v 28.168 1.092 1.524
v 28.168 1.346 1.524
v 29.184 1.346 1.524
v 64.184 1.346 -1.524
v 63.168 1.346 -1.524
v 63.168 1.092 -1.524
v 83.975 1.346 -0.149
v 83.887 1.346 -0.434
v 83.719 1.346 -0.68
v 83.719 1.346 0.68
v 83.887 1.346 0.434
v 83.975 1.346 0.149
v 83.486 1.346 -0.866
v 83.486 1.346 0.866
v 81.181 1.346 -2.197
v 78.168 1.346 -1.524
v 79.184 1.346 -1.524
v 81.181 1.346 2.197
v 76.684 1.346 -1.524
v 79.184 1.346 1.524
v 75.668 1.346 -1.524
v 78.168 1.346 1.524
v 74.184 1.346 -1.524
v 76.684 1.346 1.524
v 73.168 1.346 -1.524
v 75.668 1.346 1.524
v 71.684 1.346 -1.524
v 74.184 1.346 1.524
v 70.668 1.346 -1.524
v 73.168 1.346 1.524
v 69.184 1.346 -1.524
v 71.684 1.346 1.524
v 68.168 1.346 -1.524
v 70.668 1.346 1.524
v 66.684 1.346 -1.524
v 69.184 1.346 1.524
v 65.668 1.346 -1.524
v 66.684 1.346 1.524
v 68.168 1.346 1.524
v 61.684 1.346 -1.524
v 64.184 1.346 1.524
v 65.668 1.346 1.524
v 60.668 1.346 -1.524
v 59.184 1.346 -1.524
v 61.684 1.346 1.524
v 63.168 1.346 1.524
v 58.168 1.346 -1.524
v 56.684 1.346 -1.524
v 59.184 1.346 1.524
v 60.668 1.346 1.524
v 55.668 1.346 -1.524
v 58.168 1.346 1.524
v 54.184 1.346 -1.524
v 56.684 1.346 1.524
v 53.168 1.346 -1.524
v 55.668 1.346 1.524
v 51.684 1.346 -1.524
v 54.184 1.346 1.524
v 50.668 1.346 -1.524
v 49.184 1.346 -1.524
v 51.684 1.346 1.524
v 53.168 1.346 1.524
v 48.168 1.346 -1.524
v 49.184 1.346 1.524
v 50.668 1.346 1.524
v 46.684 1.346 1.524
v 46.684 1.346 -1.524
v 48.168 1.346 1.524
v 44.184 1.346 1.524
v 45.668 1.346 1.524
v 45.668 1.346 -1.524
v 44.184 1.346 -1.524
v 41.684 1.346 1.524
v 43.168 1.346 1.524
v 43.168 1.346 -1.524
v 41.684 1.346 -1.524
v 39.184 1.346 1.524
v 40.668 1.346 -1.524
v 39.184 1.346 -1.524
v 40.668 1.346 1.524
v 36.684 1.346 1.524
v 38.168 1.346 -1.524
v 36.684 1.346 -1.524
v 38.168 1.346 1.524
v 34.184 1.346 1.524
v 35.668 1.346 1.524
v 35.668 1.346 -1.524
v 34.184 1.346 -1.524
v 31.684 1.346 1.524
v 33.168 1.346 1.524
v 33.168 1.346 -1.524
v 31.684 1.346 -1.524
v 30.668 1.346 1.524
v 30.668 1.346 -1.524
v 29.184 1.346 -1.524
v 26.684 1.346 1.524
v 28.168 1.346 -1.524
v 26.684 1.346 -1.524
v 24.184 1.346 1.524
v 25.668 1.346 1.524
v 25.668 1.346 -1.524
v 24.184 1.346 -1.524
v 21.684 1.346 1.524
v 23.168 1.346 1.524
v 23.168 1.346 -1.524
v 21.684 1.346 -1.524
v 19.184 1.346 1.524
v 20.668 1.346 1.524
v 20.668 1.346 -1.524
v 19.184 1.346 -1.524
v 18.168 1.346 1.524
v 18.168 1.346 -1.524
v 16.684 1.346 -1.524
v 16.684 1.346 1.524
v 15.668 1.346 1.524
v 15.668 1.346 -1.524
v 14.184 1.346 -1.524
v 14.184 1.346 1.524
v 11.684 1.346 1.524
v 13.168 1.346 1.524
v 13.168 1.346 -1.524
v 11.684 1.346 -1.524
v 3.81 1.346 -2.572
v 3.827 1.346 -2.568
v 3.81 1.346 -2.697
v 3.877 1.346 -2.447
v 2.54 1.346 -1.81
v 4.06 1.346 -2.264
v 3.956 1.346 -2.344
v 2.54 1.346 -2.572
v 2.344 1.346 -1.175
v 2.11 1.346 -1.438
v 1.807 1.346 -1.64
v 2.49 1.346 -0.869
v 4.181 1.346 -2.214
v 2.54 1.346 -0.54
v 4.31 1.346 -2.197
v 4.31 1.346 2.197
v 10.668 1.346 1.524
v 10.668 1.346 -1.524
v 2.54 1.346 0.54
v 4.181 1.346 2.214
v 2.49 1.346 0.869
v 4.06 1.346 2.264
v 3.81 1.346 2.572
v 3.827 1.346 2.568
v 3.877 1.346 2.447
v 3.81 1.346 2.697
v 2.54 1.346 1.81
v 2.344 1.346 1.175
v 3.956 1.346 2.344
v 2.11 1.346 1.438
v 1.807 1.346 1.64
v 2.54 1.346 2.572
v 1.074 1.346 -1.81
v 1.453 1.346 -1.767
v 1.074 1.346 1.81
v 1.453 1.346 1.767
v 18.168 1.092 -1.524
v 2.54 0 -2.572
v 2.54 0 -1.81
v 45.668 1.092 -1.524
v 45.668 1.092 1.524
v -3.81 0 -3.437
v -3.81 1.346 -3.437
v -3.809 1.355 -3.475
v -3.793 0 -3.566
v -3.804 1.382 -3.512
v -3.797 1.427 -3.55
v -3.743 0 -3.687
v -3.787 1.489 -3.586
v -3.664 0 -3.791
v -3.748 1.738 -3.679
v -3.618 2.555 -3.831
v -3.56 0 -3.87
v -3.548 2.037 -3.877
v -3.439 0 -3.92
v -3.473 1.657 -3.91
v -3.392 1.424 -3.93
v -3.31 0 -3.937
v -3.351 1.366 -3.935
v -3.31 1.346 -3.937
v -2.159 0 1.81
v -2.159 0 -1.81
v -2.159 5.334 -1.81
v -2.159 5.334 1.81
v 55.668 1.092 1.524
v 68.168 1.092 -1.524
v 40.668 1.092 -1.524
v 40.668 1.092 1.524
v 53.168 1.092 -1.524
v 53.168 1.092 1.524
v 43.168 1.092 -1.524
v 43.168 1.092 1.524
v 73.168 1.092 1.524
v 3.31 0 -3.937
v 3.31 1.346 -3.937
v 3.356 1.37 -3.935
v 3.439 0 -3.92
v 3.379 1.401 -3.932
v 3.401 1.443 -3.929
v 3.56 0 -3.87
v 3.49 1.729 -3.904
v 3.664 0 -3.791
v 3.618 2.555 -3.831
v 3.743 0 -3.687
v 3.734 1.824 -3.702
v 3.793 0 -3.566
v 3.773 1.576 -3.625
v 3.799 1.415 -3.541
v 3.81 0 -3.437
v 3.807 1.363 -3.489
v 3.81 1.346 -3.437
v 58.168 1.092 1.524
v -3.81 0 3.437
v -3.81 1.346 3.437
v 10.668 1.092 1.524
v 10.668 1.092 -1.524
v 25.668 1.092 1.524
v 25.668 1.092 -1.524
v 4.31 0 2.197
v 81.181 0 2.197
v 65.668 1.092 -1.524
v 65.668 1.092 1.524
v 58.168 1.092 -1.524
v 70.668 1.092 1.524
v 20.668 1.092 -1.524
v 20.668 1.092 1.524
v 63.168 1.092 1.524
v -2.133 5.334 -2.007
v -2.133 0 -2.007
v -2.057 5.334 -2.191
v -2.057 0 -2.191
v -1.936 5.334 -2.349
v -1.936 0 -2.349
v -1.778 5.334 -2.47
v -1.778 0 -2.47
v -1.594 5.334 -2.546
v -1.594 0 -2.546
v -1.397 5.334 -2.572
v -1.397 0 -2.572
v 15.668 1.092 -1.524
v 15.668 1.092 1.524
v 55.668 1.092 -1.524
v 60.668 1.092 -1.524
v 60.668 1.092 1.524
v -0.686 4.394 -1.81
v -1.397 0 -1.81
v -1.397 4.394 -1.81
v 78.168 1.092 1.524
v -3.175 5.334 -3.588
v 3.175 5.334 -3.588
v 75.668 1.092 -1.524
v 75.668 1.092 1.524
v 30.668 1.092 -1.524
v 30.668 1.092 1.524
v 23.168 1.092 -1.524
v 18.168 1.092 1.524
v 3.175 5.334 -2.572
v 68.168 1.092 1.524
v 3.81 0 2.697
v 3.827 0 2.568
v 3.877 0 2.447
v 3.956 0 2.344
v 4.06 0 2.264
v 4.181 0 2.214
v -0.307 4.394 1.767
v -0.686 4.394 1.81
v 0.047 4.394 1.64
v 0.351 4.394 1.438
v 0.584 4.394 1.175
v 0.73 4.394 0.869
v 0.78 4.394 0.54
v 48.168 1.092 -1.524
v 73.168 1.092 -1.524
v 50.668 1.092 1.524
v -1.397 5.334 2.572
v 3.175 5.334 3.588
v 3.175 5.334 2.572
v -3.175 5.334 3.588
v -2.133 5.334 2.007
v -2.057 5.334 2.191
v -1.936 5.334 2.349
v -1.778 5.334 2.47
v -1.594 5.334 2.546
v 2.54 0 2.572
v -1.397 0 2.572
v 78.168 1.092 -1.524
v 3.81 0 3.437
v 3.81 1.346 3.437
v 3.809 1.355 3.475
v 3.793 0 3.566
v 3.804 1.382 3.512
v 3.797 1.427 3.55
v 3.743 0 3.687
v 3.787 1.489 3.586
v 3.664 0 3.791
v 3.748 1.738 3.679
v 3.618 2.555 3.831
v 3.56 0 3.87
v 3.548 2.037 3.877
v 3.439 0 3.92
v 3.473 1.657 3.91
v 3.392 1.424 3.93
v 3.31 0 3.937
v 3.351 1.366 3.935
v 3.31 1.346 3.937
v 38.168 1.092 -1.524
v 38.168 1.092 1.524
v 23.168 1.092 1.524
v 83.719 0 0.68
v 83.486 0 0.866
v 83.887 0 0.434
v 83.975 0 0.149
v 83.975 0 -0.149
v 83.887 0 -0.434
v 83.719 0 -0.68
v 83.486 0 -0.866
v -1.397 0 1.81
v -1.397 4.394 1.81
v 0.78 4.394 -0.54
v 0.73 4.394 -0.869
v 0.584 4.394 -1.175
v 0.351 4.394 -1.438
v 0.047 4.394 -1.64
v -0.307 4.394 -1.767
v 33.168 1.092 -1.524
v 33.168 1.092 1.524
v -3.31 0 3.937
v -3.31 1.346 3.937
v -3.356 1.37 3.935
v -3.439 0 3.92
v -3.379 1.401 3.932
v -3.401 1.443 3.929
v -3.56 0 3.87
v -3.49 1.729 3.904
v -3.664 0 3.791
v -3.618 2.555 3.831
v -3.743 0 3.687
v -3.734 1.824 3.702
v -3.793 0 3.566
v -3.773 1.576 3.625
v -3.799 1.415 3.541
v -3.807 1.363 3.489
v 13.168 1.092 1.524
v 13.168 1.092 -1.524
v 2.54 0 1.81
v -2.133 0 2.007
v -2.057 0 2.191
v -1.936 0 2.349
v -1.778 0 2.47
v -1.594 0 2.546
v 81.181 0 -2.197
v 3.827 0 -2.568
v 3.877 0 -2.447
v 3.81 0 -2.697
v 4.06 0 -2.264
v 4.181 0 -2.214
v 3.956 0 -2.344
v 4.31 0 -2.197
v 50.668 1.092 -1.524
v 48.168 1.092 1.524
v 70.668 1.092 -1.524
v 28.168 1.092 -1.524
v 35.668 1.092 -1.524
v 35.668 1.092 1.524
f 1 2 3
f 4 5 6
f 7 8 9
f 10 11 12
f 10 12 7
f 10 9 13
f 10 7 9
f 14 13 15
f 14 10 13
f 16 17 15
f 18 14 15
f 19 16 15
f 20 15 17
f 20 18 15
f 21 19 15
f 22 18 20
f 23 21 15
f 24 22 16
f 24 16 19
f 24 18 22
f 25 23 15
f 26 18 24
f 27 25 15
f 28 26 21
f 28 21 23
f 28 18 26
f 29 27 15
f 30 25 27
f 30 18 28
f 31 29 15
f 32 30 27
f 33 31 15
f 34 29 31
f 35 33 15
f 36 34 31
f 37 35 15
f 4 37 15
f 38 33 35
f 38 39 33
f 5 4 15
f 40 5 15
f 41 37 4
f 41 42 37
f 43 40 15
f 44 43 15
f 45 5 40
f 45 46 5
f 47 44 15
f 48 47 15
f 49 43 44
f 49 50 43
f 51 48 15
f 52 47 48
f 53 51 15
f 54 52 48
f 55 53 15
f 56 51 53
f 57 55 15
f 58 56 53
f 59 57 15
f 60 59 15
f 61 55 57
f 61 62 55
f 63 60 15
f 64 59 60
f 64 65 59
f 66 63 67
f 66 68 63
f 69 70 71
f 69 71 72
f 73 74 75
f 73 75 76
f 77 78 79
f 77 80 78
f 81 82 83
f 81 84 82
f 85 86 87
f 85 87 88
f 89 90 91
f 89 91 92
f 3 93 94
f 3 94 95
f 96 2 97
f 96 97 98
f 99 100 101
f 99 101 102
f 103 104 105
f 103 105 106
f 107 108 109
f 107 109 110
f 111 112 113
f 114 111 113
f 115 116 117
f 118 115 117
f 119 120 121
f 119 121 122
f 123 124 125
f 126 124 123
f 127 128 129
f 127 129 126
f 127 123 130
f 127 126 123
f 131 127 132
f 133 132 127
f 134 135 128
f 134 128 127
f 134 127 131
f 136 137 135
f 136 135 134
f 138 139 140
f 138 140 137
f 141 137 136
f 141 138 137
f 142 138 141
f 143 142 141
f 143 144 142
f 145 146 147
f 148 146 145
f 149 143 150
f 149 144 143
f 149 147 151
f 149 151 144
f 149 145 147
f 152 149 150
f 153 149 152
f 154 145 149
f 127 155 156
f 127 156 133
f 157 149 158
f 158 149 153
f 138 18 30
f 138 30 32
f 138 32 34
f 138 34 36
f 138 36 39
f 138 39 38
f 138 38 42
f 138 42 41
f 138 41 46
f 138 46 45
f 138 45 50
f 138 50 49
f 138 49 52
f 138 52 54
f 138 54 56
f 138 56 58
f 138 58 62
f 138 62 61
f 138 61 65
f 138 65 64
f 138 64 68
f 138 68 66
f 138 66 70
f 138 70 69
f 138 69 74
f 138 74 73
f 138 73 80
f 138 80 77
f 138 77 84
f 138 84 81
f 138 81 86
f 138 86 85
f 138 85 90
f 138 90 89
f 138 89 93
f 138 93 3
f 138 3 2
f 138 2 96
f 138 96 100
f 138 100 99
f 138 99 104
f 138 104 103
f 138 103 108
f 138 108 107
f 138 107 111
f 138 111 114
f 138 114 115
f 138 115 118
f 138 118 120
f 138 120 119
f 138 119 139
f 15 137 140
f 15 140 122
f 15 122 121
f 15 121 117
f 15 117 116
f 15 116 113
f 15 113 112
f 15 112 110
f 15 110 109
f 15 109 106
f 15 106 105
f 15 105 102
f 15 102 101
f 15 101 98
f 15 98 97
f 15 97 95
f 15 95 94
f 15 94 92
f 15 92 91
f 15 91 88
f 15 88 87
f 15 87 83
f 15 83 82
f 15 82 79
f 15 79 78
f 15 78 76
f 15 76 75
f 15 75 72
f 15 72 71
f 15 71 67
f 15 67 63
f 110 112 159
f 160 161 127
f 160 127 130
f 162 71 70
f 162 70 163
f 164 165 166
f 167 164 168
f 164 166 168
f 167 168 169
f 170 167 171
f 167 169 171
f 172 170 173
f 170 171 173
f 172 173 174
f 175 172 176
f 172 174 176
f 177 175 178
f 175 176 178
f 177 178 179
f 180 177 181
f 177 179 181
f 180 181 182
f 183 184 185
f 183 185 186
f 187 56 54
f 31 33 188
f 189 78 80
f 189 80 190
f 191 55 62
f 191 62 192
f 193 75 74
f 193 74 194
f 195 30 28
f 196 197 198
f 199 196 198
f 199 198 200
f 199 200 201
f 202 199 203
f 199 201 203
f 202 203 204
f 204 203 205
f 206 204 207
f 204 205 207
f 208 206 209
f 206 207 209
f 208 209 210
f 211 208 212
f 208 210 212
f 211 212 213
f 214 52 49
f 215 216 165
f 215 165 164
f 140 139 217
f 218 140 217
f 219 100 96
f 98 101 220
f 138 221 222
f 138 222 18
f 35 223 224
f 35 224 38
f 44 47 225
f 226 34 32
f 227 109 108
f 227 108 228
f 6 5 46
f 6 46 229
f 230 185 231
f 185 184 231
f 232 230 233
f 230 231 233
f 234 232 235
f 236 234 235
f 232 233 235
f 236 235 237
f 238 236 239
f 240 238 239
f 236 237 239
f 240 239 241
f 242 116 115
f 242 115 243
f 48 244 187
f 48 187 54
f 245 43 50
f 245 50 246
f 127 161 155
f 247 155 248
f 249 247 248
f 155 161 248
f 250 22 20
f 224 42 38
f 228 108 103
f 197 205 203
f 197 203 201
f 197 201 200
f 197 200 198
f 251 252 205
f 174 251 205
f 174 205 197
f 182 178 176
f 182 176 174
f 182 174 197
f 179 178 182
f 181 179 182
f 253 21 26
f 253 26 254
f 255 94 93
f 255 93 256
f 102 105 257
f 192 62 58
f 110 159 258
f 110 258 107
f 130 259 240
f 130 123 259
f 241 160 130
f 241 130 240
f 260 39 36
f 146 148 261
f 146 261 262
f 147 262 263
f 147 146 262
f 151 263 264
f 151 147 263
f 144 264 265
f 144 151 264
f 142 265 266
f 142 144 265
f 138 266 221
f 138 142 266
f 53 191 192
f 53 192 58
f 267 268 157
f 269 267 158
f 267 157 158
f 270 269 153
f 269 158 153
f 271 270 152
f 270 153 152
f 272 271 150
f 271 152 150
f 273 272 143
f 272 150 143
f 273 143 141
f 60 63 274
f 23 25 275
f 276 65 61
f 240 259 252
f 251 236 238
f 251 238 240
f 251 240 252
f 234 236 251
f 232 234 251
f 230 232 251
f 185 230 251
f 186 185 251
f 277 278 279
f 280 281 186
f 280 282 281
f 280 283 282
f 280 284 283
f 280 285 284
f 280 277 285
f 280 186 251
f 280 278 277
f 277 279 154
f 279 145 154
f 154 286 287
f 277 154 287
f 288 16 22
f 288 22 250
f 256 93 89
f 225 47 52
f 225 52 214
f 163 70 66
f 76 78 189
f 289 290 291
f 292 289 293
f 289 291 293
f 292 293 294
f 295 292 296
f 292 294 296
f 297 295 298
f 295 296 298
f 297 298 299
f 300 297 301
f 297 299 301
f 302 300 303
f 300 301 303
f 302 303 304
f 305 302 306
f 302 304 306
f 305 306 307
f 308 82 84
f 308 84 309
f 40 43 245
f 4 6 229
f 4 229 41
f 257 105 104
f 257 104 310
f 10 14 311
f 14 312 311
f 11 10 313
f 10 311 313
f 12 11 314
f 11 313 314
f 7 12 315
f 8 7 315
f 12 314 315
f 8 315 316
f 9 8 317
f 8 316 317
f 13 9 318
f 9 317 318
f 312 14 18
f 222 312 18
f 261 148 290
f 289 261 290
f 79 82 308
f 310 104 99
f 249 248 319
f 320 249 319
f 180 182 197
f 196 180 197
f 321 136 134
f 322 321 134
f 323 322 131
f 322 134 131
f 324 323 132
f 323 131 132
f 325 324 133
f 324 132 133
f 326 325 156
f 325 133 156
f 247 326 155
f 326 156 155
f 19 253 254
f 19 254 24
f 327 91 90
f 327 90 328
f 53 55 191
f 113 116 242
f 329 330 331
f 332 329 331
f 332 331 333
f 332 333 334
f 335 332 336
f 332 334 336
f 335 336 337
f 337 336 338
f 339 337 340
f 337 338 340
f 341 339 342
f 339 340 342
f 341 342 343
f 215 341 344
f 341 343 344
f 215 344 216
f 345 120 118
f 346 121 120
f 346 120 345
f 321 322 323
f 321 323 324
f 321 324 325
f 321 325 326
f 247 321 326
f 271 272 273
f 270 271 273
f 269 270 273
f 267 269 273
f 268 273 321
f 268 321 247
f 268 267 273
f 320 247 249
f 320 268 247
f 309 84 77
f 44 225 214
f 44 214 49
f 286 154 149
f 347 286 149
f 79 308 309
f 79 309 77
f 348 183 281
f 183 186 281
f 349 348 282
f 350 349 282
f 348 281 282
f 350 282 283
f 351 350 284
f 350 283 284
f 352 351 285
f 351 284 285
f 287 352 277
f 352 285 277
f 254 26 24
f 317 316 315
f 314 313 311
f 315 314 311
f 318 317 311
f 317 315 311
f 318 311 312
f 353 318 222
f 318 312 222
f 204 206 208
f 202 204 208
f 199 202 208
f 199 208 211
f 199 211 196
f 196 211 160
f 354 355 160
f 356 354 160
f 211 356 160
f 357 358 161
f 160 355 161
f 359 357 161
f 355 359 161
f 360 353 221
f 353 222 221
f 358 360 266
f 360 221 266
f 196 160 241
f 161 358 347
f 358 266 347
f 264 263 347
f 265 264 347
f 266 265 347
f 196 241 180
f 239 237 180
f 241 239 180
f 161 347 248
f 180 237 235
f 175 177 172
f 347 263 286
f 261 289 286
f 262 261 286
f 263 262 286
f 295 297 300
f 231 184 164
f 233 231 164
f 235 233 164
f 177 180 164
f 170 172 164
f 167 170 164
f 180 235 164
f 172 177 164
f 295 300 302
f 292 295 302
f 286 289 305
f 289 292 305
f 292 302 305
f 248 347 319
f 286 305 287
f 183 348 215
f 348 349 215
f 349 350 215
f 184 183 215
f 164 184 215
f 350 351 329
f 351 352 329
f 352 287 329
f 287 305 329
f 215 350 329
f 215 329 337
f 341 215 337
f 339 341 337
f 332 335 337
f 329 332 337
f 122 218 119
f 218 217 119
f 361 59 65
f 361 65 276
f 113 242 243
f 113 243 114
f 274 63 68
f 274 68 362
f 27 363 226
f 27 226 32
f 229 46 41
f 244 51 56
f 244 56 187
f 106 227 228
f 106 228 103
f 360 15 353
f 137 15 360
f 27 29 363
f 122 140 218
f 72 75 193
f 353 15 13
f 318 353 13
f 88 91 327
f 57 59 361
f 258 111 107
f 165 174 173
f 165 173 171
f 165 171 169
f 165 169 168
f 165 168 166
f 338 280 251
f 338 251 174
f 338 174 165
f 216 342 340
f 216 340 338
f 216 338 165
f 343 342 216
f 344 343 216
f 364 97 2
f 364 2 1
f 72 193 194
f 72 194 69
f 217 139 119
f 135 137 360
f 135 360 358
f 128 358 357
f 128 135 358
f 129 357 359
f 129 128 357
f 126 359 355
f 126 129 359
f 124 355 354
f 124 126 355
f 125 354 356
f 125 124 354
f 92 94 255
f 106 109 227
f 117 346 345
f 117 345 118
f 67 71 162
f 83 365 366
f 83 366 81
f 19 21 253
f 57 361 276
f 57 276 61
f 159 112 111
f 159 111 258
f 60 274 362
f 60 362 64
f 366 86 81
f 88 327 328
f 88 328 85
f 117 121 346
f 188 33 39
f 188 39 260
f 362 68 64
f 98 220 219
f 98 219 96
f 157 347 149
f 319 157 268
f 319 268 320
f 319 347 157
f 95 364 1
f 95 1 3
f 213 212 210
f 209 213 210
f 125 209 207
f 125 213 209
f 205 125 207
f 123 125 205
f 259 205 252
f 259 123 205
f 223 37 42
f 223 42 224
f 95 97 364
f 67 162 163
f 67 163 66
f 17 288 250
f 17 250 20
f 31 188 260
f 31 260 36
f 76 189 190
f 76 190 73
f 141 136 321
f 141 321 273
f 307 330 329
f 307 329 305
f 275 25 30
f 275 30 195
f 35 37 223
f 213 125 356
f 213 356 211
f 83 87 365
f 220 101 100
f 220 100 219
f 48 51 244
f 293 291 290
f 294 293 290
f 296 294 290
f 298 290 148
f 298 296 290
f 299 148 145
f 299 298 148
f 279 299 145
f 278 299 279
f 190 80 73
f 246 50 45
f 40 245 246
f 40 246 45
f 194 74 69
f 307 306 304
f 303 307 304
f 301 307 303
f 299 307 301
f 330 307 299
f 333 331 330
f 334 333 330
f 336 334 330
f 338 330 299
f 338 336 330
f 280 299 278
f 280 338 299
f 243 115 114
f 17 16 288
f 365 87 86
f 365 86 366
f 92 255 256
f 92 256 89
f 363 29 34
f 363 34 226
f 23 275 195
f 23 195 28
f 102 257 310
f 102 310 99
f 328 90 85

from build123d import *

# Parameters (mm, degrees)
EXTRUDE1_DEPTH      = 3.937
DRAFT1_START        = -3.81
DRAFT1_DEPTH        = 7.62
SKETCH3_W           = 5.969
SKETCH3_H           = 5.144225416
CUT_EXTRUDE1_DEPTH  = 16.999459798
CUT_EXTRUDE2_DEPTH  = 16.999459798
SKETCH5_W           = 3.937
SKETCH5_H           = 3.620225416
EXTRUDE2_DEPTH      = 3.048
DRAFT2_ANGLE        = 30
FILLET1_R           = 1.27
FILLET2_R           = 0.762
SKETCH6_W           = 3.937
SKETCH6_H           = 3.620225416
EXTRUDE3_DEPTH      = 1.3462
CUT_EXTRUDE3_DEPTH  = 16.999459798
SKETCH12_W          = 4.3942
SKETCH12_H          = 1.3462
BOSS_EXTRUDE1_DEPTH = 70
CUT_EXTRUDE8_DEPTH  = 1.524
LPATTERN1_START     = -1.524
LPATTERN1_DEPTH     = 3.048
CUT_EXTRUDE9_DEPTH  = 86.170550743
FILLET3_R           = 1
CUT_EXTRUDE10_DEPTH = 85.172743295
FILLET4_R           = 0.5


# Read off the part's stored shape, not the designer's step: Draft1, LPattern1
with BuildPart() as part:
    # Sketch1 → Extrude1 (new, symmetric)
    with BuildSketch(Plane.XY):
        Polygon((3.81, 1.3462), (3.175, 5.334), (-3.175, 5.334), (-3.81, 1.3462), (-3.81, 0), (14.986, 0), (14.986, 1.3462), align=None)
    extrude(amount=EXTRUDE1_DEPTH, both=True)

    # Draft1 outline → Draft1 (cut)
    with BuildSketch(Plane.YZ.offset(DRAFT1_START)):
        Polygon((1.3462, 3.937), (5.334, 3.588112708), (5.334, 3.937), align=None)
        Polygon((5.334, -3.588112708), (1.3462, -3.937), (5.334, -3.937), align=None)
    extrude(amount=DRAFT1_DEPTH, mode=Mode.SUBTRACT)

    # Sketch3 → Cut-Extrude1 (cut, through all)
    with BuildSketch(Plane(origin=(0, 1.3462, 0), x_dir=(-1, 0, 0), z_dir=(0, 1, 0))):
        with Locations((-0.8255, 0)):
            Rectangle(SKETCH3_W, SKETCH3_H)
    extrude(amount=CUT_EXTRUDE1_DEPTH, mode=Mode.SUBTRACT)

    # Sketch4 → Cut-Extrude2 (cut, through all)
    with BuildSketch(Plane(origin=(0, 1.3462, 0), x_dir=(-1, 0, 0), z_dir=(0, 1, 0))):
        Polygon((2.159, 2.572112708), (-2.54, 2.572112708), (-2.54, 1.810112708), (1.397, 1.810112708), (1.397, -1.810112708), (-2.54, -1.810112708), (-2.54, -2.572112708), (2.159, -2.572112708), align=None)
    extrude(amount=-CUT_EXTRUDE2_DEPTH, mode=Mode.SUBTRACT)

    # Sketch5 → Extrude2 (add)
    with BuildSketch(Plane(origin=(0, 1.3462, 0), x_dir=(-1, 0, 0), z_dir=(0, 1, 0))):
        with Locations((-0.5715, 0)):
            Rectangle(SKETCH5_W, SKETCH5_H)
    extrude(amount=EXTRUDE2_DEPTH)

    # Draft2
    draft2_faces = [part.faces().sort_by_distance(p)[0] for p in [
        (2.54, 2.8702, 0),
    ]]
    draft(draft2_faces, Plane(origin=(14.986, 1.3462, 3.937), x_dir=(1, 0, 0), z_dir=(0, 1, 0)), DRAFT2_ANGLE)

    # Fillet1
    # the kernel refuses this fillet: 1.27 mm, written as the material it takes off along each edge
    with BuildSketch(Plane(origin=(4.1275, -1.403430657, 1.810112708), x_dir=(-0.866025403784438, -0.500000000000001, 0), z_dir=(-0.500000000000001, 0.866025403784438, 0))) as fillet1_piece_1_section:
        with BuildLine():
            CenterArc((FILLET1_R, -FILLET1_R), FILLET1_R, 90, 90)
            Line((0, -FILLET1_R), (0, 0))
            Line((0, 0), (FILLET1_R, 0))
        make_face()
    fillet1_piece_1 = extrude(amount=9.869527241, mode=Mode.PRIVATE)
    fillet1_piece_1 = split(fillet1_piece_1, bisect_by=Plane(origin=(2.54, 0.912532514, 1.637821639), z_dir=(-1, 0, 0)), keep=Keep.TOP, mode=Mode.PRIVATE)
    add(fillet1_piece_1, mode=Mode.SUBTRACT)
    with BuildSketch(Plane(origin=(4.1275, -1.403430657, -1.810112708), x_dir=(-0.8660254037844382, -0.500000000000001, 0), z_dir=(-0.500000000000001, 0.866025403784438, 0))) as fillet1_piece_2_section:
        with BuildLine():
            CenterArc((FILLET1_R, FILLET1_R), FILLET1_R, 180, 90)
            Line((0, FILLET1_R), (0, 0))
            Line((0, 0), (FILLET1_R, 0))
        make_face()
    fillet1_piece_2 = extrude(amount=9.869527241, mode=Mode.PRIVATE)
    fillet1_piece_2 = split(fillet1_piece_2, bisect_by=Plane(origin=(2.54, 0.912532514, -1.637821639), z_dir=(-1, 0, 0)), keep=Keep.TOP, mode=Mode.PRIVATE)
    add(fillet1_piece_2, mode=Mode.SUBTRACT)

    # Fillet2
    fillet2_edges = [part.edges().sort_by_distance(p)[0] for p in [
        (-2.159, 2.667, 2.572112708),
        (-2.159, 2.667, -2.572112708),
    ]]
    fillet(fillet2_edges, radius=FILLET2_R)

    # Sketch6 → Extrude3 (add)
    with BuildSketch(Plane.XZ):
        with Locations((0.5715, 0)):
            Rectangle(SKETCH6_W, SKETCH6_H)
    extrude(amount=-EXTRUDE3_DEPTH)

    # Sketch7 → Cut-Extrude3 (cut, through all)
    with BuildSketch(Plane(origin=(0, 1.3462, 0), x_dir=(-1, 0, 0), z_dir=(0, 1, 0))):
        Polygon((-14.986, 3.937), (-3.81, 3.937), (-10.668, 2.1971), (-14.986, 2.1971), align=None)
        Polygon((-14.986, -3.937), (-3.81, -3.937), (-10.668, -2.1971), (-14.986, -2.1971), align=None)
    extrude(amount=-CUT_EXTRUDE3_DEPTH, mode=Mode.SUBTRACT)

    # Sketch12 → Boss-Extrude1 (add)
    with BuildSketch(Plane(origin=(14.986, 0, 0), x_dir=(0, 0, -1), z_dir=(1, 0, 0))):
        with Locations((0, 0.6731)):
            Rectangle(SKETCH12_W, SKETCH12_H)
    extrude(amount=BOSS_EXTRUDE1_DEPTH)

    # Sketch11 → Cut-Extrude8 (cut, symmetric)
    with BuildSketch(Plane.XY):
        Polygon((10.668, 1.3462), (10.668, 1.0922), (11.684, 1.3462), (11.684, 1.637608524), (10.668, 1.637608524), align=None)
    extrude(amount=CUT_EXTRUDE8_DEPTH, both=True, mode=Mode.SUBTRACT)

    # LPattern1 outline → LPattern1 (cut)
    with BuildSketch(Plane.XY.offset(LPATTERN1_START)):
        Polygon((14.184, 1.3462), (13.168, 1.3462), (13.168, 1.0922), align=None)
        Polygon((79.184, 1.3462), (78.168, 1.3462), (78.168, 1.0922), align=None)
        Polygon((76.684, 1.3462), (75.668, 1.3462), (75.668, 1.0922), align=None)
        Polygon((74.184, 1.3462), (73.168, 1.3462), (73.168, 1.0922), align=None)
        Polygon((71.684, 1.3462), (70.668, 1.3462), (70.668, 1.0922), align=None)
        Polygon((69.184, 1.3462), (68.168, 1.3462), (68.168, 1.0922), align=None)
        Polygon((66.684, 1.3462), (65.668, 1.3462), (65.668, 1.0922), align=None)
        Polygon((64.184, 1.3462), (63.168, 1.3462), (63.168, 1.0922), align=None)
        Polygon((61.684, 1.3462), (60.668, 1.3462), (60.668, 1.0922), align=None)
        Polygon((59.184, 1.3462), (58.168, 1.3462), (58.168, 1.0922), align=None)
        Polygon((56.684, 1.3462), (55.668, 1.3462), (55.668, 1.0922), align=None)
        Polygon((54.184, 1.3462), (53.168, 1.3462), (53.168, 1.0922), align=None)
        Polygon((51.684, 1.3462), (50.668, 1.3462), (50.668, 1.0922), align=None)
        Polygon((49.184, 1.3462), (48.168, 1.3462), (48.168, 1.0922), align=None)
        Polygon((46.684, 1.3462), (45.668, 1.3462), (45.668, 1.0922), align=None)
        Polygon((44.184, 1.3462), (43.168, 1.3462), (43.168, 1.0922), align=None)
        Polygon((41.684, 1.3462), (40.668, 1.3462), (40.668, 1.0922), align=None)
        Polygon((39.184, 1.3462), (38.168, 1.3462), (38.168, 1.0922), align=None)
        Polygon((36.684, 1.3462), (35.668, 1.3462), (35.668, 1.0922), align=None)
        Polygon((34.184, 1.3462), (33.168, 1.3462), (33.168, 1.0922), align=None)
        Polygon((31.684, 1.3462), (30.668, 1.3462), (30.668, 1.0922), align=None)
        Polygon((29.184, 1.3462), (28.168, 1.3462), (28.168, 1.0922), align=None)
        Polygon((26.684, 1.3462), (25.668, 1.3462), (25.668, 1.0922), align=None)
        Polygon((24.184, 1.3462), (23.168, 1.3462), (23.168, 1.0922), align=None)
        Polygon((21.684, 1.3462), (20.668, 1.3462), (20.668, 1.0922), align=None)
        Polygon((19.184, 1.3462), (18.168, 1.3462), (18.168, 1.0922), align=None)
        Polygon((16.684, 1.3462), (15.668, 1.3462), (15.668, 1.0922), align=None)
    extrude(amount=LPATTERN1_DEPTH, mode=Mode.SUBTRACT)

    # Sketch13 → Cut-Extrude9 (cut, through all)
    with BuildSketch(Plane(origin=(0, 1.3462, 0), x_dir=(1, 0, 0), z_dir=(0, 1, 0))):
        Polygon((84.986, -2.1971), (84.986, 0), (81.180511171, -2.1971), align=None)
        Polygon((81.180511171, 2.1971), (84.986, 0), (84.986, 2.1971), align=None)
    extrude(amount=-CUT_EXTRUDE9_DEPTH, mode=Mode.SUBTRACT)

    # Fillet3
    fillet3_edges = [part.edges().sort_by_distance(p)[0] for p in [
        (84.986, 0.6731, 0),
    ]]
    fillet(fillet3_edges, radius=FILLET3_R)

    # Sketch14 → Cut-Extrude10 (cut, through all)
    with BuildSketch(Plane(origin=(0, 1.3462, 0), x_dir=(1, 0, 0), z_dir=(0, 1, 0))):
        Polygon((10.668, 2.1971), (3.81, 2.1971), (3.81, 3.937), align=None)
    cut_extrude10 = extrude(amount=-CUT_EXTRUDE10_DEPTH, mode=Mode.SUBTRACT)

    # Mirror1: Cut-Extrude10 across plane
    add(cut_extrude10.mirror(Plane.XY), mode=Mode.SUBTRACT)

    # Fillet4
    # the kernel refuses this fillet: 0.5 mm, written as the material it adds along each edge
    with BuildSketch(Plane(origin=(3.81, 1.3462, -2.1971), x_dir=(1, 0, 0), z_dir=(0, -1, 0)), Plane(origin=(3.81, 1.3462, 2.1971), x_dir=(0, 0, 1), z_dir=(0, -1, 0))) as fillet4_piece_1:
        with BuildLine():
            CenterArc((FILLET4_R, -FILLET4_R), FILLET4_R, 90, 90)
            Line((0, -FILLET4_R), (0, 0))
            Line((0, 0), (FILLET4_R, 0))
        make_face()
    extrude(amount=1.3462)
    # the kernel refuses this fillet: 0.5 mm, written as the material it takes off along each edge
    with BuildSketch(Plane(origin=(3.81, 2.5962, 3.937), x_dir=(0, 0, -1), z_dir=(0, -1, 0)), Plane(origin=(-3.81, 2.5962, 3.937), x_dir=(1, 0, 0), z_dir=(0, -1, 0)), Plane(origin=(3.81, 2.5962, -3.937), x_dir=(-1, 0, 0), z_dir=(0, -1, 0)), Plane(origin=(-3.81, 2.5962, -3.937), x_dir=(0, 0, 1), z_dir=(0, -1, 0))) as fillet4_2_piece_1:
        with BuildLine():
            CenterArc((FILLET4_R, -FILLET4_R), FILLET4_R, 90, 90)
            Line((0, -FILLET4_R), (0, 0))
            Line((0, 0), (FILLET4_R, 0))
        make_face()
    extrude(amount=3.8462, mode=Mode.SUBTRACT)


solid = part.part
